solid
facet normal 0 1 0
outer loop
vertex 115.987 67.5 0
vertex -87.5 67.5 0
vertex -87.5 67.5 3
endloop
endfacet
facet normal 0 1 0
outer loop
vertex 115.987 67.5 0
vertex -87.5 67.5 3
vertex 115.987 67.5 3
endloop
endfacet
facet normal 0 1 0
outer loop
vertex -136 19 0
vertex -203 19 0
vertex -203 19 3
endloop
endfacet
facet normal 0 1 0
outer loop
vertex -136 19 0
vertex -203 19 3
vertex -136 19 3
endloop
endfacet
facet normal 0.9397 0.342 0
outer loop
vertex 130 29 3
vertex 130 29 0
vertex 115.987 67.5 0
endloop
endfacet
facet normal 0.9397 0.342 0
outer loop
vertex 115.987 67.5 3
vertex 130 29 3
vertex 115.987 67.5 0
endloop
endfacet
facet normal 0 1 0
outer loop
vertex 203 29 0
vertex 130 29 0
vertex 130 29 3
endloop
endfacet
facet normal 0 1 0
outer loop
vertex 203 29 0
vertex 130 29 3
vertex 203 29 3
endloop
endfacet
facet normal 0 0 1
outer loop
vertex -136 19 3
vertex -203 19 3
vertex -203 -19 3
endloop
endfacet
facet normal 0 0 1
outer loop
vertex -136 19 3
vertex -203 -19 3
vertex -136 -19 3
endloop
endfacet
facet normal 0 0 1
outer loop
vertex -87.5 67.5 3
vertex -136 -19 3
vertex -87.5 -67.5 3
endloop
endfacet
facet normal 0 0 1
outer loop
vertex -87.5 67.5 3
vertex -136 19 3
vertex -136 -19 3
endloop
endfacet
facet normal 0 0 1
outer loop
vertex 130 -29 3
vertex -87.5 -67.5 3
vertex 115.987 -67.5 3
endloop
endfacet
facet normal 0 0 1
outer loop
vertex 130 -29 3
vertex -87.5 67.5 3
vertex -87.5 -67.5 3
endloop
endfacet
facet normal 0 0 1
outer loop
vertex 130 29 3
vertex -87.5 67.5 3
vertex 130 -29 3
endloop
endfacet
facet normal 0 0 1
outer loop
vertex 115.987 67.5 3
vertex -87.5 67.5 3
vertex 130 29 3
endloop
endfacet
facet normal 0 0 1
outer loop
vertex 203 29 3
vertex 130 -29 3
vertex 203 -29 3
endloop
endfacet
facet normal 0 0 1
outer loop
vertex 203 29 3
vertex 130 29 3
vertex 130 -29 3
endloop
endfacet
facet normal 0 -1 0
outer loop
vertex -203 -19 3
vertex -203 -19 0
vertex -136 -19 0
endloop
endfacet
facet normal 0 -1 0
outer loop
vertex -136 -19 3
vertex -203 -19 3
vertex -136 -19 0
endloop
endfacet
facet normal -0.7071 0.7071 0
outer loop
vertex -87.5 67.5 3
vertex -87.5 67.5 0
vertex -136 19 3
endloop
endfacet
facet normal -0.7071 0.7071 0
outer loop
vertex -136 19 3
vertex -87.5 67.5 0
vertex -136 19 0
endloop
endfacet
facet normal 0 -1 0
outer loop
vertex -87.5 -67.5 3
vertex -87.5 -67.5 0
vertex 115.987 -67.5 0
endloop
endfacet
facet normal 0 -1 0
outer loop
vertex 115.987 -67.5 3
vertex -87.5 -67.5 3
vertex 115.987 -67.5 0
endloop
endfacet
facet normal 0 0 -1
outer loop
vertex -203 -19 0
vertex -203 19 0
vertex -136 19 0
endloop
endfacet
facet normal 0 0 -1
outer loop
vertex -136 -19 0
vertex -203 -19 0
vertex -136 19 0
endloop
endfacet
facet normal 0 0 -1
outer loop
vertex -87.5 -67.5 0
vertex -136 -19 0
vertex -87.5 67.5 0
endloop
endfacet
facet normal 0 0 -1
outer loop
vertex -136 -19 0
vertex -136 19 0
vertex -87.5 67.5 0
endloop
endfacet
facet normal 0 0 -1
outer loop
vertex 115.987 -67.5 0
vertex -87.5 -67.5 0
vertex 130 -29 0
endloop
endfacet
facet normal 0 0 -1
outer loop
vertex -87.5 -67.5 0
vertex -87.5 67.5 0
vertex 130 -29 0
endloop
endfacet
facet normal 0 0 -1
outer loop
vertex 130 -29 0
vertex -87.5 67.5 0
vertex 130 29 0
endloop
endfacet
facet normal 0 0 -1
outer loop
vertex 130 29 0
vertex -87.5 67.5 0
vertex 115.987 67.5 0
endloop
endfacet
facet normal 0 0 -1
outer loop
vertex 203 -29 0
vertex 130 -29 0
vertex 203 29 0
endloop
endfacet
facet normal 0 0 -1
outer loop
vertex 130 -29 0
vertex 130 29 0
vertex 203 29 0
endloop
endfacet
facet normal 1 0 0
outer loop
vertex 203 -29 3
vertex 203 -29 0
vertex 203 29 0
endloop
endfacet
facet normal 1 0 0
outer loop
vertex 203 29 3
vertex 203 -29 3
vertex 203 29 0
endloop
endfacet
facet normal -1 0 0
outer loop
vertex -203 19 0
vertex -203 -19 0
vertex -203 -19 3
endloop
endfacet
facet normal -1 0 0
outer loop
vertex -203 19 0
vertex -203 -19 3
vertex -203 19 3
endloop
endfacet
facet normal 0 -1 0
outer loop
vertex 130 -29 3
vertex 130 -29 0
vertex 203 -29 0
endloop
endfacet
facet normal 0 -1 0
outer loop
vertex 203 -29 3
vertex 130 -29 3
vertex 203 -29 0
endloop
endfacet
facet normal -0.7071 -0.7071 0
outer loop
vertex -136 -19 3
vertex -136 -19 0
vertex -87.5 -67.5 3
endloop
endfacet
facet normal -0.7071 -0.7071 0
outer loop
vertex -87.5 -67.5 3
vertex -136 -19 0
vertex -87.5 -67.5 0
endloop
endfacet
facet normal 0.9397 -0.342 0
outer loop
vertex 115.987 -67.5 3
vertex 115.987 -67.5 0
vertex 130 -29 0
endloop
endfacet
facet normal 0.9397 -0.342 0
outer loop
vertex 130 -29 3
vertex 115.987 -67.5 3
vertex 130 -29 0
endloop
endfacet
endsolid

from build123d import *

# Parameters (mm, degrees)
F0_W     = 203.487146
F0_H     = 135
F0_W_2   = 67
F0_H_2   = 38
F0_W_3   = 73
F0_H_3   = 58
F1_DEPTH = 3


with BuildPart() as f1:
    # F0 (on Top) → F1 (new body)
    with BuildSketch(Plane.XY):
        Polygon((-136, -19), (-87.5, -67.5), (-87.5, 67.5), (-136, 19), align=None)
        with Locations((14.243573, 0)):
            Rectangle(F0_W, F0_H)
        with Locations((-169.5, 0)):
            Rectangle(F0_W_2, F0_H_2)
        Polygon((115.987146, 67.5), (115.987146, -67.5), (130, -29), (130, 29), align=None)
        with Locations((166.5, 0)):
            Rectangle(F0_W_3, F0_H_3)
    extrude(amount=F1_DEPTH)


solid = f1.part
